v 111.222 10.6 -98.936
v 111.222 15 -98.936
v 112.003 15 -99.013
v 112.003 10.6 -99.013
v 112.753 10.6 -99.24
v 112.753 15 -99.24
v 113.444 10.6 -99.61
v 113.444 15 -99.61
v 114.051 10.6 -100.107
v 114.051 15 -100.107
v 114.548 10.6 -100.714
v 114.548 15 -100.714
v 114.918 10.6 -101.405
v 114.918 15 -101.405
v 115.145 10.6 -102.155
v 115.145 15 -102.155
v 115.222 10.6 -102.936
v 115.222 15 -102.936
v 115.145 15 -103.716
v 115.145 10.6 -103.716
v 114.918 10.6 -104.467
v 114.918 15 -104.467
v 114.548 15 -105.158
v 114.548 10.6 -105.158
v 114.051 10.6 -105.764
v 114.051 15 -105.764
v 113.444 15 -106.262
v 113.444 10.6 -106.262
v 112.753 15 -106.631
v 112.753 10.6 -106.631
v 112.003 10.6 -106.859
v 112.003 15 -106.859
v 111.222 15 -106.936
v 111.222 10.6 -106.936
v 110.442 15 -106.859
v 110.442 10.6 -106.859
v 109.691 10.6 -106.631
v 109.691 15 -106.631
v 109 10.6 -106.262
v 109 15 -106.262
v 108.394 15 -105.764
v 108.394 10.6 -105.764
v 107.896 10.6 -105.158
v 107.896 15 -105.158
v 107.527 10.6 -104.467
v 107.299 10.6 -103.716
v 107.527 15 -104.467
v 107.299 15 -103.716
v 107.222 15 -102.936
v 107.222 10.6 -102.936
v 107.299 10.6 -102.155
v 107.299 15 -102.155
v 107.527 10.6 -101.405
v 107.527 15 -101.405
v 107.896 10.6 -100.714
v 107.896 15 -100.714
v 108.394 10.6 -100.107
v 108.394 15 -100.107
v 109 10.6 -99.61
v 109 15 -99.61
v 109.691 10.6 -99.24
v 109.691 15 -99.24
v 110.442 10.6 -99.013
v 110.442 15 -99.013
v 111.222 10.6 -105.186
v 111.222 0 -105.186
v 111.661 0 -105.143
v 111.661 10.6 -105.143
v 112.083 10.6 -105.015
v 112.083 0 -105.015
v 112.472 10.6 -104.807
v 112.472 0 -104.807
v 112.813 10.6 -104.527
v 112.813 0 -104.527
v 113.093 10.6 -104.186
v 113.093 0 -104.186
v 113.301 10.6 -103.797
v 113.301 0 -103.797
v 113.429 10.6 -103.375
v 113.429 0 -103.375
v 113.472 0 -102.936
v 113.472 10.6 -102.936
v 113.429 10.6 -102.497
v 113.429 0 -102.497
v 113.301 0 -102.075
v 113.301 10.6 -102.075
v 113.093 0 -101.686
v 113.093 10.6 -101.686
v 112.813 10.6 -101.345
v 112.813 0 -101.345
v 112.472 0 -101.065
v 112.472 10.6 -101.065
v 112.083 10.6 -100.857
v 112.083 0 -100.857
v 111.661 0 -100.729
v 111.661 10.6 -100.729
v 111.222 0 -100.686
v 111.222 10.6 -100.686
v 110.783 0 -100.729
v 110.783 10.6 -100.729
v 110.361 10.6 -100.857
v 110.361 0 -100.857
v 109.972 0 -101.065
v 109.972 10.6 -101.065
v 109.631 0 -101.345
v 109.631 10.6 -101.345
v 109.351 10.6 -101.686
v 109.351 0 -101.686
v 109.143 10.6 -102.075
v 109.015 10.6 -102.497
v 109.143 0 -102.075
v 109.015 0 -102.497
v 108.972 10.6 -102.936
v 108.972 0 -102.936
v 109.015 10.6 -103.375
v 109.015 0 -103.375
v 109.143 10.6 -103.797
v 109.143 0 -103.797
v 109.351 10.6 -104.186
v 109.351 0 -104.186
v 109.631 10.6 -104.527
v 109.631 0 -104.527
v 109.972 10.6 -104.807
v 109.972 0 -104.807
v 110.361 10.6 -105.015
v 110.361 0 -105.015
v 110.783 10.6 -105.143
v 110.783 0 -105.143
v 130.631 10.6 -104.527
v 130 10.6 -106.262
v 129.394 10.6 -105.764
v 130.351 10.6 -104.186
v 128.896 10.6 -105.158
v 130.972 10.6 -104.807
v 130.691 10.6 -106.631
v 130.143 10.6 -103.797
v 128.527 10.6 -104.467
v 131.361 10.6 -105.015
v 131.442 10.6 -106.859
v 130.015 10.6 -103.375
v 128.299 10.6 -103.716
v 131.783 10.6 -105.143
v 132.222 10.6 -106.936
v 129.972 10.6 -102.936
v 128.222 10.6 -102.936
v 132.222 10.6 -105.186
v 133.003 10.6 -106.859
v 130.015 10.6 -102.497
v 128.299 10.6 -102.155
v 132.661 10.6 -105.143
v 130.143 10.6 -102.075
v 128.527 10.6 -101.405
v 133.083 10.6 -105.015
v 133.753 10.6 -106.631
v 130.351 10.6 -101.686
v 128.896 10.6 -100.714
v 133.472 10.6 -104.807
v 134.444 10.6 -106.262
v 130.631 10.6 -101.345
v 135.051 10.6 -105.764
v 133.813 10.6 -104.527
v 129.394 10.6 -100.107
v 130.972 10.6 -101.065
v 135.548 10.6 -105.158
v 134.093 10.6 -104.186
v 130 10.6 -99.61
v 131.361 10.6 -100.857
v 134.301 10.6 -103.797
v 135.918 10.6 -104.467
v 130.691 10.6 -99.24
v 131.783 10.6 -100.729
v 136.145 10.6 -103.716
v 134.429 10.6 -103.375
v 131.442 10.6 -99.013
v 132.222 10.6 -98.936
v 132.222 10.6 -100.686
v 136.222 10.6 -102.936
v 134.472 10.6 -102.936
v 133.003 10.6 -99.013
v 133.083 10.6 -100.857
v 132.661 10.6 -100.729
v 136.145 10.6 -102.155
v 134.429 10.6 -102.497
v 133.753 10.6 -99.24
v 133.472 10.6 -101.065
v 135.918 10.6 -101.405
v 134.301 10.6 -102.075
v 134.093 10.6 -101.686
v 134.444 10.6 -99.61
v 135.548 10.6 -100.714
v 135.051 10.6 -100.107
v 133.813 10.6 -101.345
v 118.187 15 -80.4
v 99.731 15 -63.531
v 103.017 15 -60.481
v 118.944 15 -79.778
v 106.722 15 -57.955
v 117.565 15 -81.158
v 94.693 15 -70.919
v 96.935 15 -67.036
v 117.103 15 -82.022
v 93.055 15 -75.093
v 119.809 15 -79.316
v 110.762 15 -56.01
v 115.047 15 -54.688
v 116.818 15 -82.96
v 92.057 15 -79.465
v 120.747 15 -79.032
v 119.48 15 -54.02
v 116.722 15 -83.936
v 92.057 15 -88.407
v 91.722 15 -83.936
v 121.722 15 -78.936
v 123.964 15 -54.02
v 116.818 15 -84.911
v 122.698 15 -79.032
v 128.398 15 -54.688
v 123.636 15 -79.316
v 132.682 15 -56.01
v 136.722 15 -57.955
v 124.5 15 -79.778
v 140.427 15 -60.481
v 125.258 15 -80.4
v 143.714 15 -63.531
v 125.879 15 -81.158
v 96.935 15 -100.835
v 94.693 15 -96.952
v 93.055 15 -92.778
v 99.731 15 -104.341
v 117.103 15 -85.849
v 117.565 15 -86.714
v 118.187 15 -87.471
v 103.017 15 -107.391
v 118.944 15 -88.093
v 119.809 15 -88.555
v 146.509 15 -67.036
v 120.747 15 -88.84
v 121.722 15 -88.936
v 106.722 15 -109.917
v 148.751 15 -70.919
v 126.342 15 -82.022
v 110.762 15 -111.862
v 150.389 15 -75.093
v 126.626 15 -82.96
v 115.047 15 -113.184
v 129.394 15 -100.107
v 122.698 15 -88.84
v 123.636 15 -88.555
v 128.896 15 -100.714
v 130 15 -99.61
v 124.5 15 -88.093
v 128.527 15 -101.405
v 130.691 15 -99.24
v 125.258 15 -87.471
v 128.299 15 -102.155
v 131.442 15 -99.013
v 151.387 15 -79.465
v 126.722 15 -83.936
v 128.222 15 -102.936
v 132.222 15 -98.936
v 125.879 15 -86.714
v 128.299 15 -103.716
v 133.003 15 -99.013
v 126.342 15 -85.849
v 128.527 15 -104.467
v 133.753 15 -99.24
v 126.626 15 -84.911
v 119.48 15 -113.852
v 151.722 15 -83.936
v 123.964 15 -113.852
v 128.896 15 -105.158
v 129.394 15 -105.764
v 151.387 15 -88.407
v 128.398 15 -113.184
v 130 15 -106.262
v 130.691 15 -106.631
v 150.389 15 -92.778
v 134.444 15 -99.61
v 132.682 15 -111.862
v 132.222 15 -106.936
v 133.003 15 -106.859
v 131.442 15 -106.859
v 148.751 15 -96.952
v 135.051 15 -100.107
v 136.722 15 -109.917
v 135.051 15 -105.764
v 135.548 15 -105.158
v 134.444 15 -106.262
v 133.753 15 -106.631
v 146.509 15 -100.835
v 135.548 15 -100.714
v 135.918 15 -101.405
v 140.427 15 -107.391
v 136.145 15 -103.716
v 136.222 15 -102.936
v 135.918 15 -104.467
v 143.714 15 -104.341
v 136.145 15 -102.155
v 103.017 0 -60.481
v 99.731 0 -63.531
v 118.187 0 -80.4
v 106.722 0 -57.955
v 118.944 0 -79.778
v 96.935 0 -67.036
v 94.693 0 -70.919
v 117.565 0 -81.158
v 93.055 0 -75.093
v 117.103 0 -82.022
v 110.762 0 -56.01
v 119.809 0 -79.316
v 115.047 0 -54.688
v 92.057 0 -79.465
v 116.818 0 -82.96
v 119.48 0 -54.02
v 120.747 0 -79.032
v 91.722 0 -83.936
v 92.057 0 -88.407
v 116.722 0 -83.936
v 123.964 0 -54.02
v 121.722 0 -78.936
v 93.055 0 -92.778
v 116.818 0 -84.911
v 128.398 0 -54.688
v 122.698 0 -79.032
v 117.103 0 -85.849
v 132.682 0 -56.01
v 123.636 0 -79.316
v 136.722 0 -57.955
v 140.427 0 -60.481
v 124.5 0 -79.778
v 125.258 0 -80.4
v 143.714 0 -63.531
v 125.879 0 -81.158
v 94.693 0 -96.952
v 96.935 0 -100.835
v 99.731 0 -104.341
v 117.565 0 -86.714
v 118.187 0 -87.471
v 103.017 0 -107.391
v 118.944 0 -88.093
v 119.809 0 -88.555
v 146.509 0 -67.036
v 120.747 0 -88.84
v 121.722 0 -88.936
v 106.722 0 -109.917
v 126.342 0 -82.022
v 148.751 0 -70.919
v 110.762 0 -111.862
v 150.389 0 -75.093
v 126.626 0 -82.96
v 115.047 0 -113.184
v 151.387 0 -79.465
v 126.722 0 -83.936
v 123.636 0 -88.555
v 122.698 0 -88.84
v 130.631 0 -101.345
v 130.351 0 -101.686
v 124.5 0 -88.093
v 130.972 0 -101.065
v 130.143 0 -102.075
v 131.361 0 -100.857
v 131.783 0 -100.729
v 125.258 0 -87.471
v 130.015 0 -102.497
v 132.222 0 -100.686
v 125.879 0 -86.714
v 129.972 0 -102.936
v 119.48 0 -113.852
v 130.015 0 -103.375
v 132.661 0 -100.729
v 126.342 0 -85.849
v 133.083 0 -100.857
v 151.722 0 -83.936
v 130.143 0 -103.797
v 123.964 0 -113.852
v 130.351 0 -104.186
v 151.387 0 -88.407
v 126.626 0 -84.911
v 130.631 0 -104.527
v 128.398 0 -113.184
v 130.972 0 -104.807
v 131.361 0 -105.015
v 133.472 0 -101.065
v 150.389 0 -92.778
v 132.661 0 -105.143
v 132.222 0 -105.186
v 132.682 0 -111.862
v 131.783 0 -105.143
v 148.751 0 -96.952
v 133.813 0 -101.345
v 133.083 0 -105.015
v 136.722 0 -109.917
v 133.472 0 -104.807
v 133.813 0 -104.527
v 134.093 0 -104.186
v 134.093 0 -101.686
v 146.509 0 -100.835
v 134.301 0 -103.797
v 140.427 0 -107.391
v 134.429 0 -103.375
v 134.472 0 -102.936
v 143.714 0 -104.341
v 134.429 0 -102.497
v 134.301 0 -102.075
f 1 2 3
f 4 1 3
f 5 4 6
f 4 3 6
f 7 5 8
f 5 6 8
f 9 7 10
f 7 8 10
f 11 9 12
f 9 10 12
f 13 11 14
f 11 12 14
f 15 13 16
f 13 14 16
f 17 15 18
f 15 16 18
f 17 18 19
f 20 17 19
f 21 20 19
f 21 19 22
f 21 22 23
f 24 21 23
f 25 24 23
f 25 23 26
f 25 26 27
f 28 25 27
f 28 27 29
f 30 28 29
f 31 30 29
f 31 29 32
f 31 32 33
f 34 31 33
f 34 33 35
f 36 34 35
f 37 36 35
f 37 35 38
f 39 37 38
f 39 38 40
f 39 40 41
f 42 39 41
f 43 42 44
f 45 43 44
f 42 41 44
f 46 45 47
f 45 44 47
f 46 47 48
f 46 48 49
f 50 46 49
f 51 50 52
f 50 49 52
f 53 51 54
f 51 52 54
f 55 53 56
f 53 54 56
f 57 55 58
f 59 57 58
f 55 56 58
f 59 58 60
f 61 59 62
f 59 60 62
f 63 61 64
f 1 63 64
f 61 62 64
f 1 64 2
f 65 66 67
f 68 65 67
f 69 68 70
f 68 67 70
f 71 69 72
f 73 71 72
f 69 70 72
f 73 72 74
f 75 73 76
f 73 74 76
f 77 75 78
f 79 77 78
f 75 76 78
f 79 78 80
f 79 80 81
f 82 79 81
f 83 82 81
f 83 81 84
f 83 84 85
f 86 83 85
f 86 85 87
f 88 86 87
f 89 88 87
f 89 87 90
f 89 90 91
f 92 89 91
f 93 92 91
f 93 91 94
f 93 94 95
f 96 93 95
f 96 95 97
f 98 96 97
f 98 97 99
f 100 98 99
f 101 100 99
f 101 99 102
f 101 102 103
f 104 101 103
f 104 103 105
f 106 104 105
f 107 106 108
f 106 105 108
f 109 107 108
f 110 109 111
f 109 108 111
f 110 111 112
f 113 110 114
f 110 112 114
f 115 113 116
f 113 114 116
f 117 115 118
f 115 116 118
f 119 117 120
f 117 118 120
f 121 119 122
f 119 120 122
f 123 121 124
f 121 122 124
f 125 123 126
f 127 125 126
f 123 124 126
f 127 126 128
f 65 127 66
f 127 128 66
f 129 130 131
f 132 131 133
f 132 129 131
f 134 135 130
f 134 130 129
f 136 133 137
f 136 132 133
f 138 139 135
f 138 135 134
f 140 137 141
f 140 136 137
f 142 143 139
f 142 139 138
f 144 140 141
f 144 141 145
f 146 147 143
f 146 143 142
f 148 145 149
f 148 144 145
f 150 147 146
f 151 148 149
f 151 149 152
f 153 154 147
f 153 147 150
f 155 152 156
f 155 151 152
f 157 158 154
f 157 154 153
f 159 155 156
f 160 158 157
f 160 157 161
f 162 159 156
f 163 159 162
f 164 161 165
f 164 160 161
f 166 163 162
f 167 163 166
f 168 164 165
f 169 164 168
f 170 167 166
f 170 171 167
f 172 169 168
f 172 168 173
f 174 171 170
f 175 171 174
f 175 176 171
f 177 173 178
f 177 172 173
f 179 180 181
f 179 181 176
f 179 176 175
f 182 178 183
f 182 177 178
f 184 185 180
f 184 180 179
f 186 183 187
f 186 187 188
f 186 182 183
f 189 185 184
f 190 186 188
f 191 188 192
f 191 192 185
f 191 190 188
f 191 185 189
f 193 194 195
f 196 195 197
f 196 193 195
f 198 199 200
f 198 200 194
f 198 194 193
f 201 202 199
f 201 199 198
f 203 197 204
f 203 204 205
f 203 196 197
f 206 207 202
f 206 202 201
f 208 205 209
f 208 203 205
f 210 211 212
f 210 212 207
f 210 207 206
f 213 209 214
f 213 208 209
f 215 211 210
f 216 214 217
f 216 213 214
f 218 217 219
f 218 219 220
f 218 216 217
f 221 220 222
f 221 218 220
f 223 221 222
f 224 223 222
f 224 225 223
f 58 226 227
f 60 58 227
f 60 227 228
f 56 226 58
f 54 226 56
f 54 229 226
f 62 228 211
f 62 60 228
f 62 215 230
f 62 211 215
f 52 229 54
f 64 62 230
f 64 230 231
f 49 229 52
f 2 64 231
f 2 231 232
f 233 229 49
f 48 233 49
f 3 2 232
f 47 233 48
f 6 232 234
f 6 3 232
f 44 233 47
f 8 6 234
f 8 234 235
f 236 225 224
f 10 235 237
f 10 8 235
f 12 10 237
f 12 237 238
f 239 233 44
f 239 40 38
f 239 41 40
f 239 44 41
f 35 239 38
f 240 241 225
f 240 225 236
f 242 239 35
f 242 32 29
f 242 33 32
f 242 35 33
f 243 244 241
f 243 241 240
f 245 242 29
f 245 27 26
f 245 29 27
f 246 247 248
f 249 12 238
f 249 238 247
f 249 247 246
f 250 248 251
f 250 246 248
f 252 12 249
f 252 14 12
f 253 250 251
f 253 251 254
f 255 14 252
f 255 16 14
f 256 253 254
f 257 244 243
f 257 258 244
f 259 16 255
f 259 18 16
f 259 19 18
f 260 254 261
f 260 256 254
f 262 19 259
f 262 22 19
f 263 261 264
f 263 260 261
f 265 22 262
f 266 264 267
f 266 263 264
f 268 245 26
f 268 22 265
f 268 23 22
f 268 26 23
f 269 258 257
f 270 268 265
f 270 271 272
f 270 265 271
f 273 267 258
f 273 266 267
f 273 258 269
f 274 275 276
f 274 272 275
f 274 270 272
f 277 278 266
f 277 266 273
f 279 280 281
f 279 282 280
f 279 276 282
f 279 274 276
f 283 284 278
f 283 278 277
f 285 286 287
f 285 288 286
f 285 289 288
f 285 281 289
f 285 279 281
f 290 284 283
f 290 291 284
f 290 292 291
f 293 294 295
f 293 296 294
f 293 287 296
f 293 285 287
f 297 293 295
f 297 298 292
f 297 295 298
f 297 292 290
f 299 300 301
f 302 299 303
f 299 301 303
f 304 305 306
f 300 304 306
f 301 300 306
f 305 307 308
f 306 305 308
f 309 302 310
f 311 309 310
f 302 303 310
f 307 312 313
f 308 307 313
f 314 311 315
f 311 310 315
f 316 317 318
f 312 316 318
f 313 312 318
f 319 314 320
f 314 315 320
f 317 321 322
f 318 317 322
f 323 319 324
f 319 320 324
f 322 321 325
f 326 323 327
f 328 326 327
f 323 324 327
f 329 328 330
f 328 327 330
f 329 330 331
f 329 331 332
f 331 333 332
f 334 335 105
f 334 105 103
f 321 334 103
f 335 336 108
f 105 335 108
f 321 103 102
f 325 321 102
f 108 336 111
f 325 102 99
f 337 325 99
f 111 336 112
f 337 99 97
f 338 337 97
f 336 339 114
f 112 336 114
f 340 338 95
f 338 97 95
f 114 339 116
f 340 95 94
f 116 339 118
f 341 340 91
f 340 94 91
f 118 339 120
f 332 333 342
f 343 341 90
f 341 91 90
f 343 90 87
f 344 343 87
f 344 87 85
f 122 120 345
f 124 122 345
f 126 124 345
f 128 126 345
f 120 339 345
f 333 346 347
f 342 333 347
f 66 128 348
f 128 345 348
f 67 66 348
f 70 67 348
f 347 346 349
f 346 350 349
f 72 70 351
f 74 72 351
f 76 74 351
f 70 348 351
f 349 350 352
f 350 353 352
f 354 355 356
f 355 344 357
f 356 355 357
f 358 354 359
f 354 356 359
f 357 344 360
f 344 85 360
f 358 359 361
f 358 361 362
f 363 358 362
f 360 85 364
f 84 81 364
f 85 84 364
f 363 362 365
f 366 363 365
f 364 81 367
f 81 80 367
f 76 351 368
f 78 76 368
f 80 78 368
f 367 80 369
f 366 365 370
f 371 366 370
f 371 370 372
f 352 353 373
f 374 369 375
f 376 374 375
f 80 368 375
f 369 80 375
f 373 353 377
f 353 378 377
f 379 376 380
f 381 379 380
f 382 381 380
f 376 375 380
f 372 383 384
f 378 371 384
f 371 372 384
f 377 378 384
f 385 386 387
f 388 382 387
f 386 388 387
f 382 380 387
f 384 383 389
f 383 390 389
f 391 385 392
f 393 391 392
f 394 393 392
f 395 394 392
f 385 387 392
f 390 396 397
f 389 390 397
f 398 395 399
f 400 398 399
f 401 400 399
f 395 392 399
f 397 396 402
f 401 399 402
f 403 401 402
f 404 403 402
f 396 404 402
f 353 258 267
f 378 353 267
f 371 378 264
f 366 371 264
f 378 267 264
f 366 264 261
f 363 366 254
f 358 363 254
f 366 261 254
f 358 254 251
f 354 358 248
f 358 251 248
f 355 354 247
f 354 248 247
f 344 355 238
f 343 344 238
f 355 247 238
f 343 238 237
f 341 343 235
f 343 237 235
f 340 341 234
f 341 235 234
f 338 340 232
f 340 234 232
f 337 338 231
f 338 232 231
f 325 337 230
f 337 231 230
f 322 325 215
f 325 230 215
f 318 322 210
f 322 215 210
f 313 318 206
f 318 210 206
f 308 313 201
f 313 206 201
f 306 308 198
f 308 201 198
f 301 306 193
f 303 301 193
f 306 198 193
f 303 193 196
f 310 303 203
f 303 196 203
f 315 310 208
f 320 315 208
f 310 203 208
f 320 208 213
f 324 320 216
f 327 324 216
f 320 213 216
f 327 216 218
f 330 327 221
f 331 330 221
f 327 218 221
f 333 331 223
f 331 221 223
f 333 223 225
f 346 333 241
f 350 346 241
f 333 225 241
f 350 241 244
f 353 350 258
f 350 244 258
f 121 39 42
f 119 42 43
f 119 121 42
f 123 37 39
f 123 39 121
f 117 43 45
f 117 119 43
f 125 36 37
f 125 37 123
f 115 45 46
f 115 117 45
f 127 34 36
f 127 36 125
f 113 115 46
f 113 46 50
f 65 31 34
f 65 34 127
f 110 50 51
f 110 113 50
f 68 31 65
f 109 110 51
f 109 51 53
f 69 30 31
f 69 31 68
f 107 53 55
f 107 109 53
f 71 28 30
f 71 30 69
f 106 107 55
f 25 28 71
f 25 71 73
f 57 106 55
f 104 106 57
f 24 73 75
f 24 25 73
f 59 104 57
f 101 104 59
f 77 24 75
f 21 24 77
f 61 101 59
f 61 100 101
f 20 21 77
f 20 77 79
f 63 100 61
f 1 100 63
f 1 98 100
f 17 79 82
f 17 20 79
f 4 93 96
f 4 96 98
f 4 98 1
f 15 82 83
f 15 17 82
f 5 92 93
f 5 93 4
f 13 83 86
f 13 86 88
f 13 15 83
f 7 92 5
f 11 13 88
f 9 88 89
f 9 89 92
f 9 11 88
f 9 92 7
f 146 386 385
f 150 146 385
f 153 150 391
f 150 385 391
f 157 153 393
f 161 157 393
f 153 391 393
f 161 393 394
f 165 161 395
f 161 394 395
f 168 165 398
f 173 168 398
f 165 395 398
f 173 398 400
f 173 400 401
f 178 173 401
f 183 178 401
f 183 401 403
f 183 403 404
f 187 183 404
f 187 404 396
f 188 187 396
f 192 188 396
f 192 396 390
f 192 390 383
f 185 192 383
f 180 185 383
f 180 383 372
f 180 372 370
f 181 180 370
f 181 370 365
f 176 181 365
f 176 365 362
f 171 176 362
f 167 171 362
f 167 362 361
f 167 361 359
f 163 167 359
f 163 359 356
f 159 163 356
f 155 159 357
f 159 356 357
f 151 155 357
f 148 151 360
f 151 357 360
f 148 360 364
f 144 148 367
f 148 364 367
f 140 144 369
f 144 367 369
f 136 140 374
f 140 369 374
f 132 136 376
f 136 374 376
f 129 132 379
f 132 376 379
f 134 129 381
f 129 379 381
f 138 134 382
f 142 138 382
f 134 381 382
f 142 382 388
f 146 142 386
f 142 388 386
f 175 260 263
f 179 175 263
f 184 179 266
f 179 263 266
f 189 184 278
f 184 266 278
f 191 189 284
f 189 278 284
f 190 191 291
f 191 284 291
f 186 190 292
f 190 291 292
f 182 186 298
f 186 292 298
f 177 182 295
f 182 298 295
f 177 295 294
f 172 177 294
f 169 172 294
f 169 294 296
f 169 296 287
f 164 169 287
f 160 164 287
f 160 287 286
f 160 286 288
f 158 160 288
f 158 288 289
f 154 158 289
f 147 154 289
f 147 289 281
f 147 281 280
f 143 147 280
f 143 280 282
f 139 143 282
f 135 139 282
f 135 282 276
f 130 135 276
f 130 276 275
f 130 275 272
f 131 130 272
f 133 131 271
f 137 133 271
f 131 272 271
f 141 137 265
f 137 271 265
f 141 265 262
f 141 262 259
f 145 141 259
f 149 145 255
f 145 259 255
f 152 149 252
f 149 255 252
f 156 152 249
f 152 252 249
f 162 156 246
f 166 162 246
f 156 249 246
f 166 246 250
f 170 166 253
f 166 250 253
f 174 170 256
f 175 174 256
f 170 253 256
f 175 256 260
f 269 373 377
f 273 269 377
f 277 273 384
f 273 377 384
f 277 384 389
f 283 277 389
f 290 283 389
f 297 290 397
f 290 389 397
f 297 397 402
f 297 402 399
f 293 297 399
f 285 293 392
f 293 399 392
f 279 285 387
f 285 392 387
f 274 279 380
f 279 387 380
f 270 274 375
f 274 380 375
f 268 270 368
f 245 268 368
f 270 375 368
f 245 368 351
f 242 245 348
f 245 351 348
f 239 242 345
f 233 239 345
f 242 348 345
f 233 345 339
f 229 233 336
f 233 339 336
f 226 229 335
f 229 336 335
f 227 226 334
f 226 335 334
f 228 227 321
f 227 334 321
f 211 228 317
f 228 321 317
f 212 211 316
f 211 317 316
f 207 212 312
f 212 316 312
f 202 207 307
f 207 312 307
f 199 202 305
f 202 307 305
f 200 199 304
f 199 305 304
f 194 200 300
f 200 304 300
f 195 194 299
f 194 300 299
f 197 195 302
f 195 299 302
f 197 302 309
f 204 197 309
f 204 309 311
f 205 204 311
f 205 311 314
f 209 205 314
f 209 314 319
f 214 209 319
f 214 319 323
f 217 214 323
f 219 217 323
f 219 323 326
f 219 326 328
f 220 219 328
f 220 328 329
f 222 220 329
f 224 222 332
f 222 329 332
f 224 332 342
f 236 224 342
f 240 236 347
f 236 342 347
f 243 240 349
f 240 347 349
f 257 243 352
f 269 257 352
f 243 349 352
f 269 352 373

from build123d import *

# Parameters (mm, degrees)
SKETCH1_R                                           = 30
BOSS_EXTRUDE1_DEPTH                                 = 15
SKETCH10_R                                          = 5
CUT_EXTRUDE2_DEPTH                                  = 15
CBORE_FOR_M4_HEX_SOCKET_HEAD_CAP_SCREW3_D           = 4.5
CBORE_FOR_M4_HEX_SOCKET_HEAD_CAP_SCREW3_DEPTH       = 15
CBORE_FOR_M4_HEX_SOCKET_HEAD_CAP_SCREW3_CBORE_D     = 8
CBORE_FOR_M4_HEX_SOCKET_HEAD_CAP_SCREW3_CBORE_DEPTH = 4.4


with BuildPart() as part:
    # Sketch1 → Boss-Extrude1 (new body)
    with BuildSketch(Plane(origin=(0, 0, 0), x_dir=(1, 0, 0), z_dir=(0, 1, 0))):
        with Locations((121.722144349, 83.935831041)):
            Circle(SKETCH1_R)
    extrude(amount=BOSS_EXTRUDE1_DEPTH)

    # Sketch10 → Cut-Extrude2 (cut)
    with BuildSketch(Plane(origin=(0, 15, 0), x_dir=(1, 0, 0), z_dir=(0, 1, 0))):
        with Locations((121.722144349, 83.935831041)):
            Circle(SKETCH10_R)
    extrude(amount=-CUT_EXTRUDE2_DEPTH, mode=Mode.SUBTRACT)

    # CBORE for M4 Hex Socket Head Cap Screw3
    with Locations(Plane(origin=(132.222144349, 15, -102.935831041), x_dir=(0, 0, 1), z_dir=(0, 1, 0))):
        with Locations((0, 0), (0, -21)):
            CounterBoreHole(CBORE_FOR_M4_HEX_SOCKET_HEAD_CAP_SCREW3_D / 2, CBORE_FOR_M4_HEX_SOCKET_HEAD_CAP_SCREW3_CBORE_D / 2, CBORE_FOR_M4_HEX_SOCKET_HEAD_CAP_SCREW3_CBORE_DEPTH, depth=CBORE_FOR_M4_HEX_SOCKET_HEAD_CAP_SCREW3_DEPTH)


solid = part.part
